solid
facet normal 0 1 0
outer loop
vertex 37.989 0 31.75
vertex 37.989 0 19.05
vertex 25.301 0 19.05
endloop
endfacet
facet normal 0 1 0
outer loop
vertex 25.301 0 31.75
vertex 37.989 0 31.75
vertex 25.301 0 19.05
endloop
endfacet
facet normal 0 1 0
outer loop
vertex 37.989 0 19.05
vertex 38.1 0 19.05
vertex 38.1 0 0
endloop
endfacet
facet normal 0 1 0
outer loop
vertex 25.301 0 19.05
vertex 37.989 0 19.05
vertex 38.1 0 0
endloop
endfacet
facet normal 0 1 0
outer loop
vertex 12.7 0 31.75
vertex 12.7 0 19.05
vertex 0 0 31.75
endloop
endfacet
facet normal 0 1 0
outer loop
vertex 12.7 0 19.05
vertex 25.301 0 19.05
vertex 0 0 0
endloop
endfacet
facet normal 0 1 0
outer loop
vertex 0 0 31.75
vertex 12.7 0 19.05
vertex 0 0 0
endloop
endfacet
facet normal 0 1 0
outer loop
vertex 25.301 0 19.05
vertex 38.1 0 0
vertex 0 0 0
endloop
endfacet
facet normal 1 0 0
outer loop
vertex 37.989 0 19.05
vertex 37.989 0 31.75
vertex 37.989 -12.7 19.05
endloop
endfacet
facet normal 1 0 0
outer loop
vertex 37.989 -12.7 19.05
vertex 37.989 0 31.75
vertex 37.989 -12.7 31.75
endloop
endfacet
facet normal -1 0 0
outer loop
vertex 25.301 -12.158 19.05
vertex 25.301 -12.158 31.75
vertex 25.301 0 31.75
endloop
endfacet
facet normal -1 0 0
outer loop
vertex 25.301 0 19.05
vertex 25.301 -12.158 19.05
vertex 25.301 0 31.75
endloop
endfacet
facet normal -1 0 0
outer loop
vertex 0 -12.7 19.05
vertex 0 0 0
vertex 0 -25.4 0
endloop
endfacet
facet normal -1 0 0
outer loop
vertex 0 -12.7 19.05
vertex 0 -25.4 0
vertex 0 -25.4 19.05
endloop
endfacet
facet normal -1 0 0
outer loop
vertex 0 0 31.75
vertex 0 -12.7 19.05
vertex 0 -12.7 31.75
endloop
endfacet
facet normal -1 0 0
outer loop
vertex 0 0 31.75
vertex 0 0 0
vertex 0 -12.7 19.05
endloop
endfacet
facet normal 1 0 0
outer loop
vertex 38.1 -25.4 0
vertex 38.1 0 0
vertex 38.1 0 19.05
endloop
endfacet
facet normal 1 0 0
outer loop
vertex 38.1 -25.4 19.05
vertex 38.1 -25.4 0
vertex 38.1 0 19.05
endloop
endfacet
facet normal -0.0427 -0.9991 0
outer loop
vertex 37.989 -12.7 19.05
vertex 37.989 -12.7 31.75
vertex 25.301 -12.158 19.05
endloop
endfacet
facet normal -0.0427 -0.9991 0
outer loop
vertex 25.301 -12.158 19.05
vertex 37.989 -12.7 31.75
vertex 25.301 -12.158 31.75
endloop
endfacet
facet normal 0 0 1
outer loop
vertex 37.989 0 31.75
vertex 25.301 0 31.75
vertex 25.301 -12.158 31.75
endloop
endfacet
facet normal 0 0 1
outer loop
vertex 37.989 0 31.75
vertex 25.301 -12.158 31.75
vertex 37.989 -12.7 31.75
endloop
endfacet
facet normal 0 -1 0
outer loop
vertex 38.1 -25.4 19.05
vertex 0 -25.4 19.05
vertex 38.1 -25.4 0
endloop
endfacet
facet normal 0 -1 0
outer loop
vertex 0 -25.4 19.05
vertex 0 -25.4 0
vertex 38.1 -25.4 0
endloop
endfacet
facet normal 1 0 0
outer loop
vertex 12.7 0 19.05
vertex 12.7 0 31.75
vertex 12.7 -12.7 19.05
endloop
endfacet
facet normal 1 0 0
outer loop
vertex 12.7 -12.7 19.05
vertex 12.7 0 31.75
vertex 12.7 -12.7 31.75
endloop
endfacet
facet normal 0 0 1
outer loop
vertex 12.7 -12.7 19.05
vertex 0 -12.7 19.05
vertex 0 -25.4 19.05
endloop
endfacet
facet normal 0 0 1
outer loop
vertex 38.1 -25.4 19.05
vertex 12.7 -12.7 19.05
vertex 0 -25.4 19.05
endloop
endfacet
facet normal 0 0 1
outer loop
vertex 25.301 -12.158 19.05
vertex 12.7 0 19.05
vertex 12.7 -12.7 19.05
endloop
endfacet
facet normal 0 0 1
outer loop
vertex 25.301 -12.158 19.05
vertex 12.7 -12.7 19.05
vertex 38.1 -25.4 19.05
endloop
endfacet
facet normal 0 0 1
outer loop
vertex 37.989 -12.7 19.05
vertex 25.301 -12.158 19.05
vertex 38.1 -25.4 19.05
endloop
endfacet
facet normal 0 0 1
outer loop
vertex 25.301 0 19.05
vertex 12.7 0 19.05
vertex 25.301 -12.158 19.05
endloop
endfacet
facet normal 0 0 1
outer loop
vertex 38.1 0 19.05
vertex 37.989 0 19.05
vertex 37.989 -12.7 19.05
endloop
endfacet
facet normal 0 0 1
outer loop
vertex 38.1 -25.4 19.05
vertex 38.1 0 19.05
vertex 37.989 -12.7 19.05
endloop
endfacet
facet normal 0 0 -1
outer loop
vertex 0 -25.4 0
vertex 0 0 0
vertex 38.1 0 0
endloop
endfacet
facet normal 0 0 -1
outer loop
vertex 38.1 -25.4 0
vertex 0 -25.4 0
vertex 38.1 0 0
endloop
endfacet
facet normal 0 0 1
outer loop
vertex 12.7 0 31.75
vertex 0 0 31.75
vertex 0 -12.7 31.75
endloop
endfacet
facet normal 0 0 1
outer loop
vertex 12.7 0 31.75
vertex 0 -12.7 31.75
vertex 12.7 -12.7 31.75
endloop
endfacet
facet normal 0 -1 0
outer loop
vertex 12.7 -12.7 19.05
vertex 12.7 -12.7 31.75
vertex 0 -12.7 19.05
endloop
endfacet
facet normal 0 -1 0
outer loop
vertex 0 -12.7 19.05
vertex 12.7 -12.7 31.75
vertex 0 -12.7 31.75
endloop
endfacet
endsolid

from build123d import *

# Parameters (mm, degrees)
F0_W     = 38.1
F0_H     = 31.75
F1_DEPTH = 25.4
F4_DEPTH = 25.4
F5_DEPTH = 12.7


with BuildPart() as f1:
    # F0 (on Front) → F1 (new body)
    with BuildSketch(Plane.XZ):
        with Locations((19.05, 15.875)):
            Rectangle(F0_W, F0_H)
    extrude(amount=F1_DEPTH)

    # F3 (on face) → F4 (cut)
    with BuildSketch(Plane.XY.offset(31.75)):
        Polygon((37.9892475903, 0), (37.9892475903, -12.7), (25.3008189245, -12.1579870905), (25.3008189245, 0), (12.7, 0), (12.7, -12.7), (0, -12.7), (0, -25.4), (38.1, -25.4), (38.1, 0), align=None)
    extrude(amount=-F4_DEPTH, mode=Mode.SUBTRACT)

    # F5 (add): a face of the model
    f5_faces = [f1.faces().sort_by_distance(p)[0] for p in [
        (19.1345000359, -15.8550557875, 6.35),
    ]]
    extrude(f5_faces, amount=F5_DEPTH)


solid = f1.part
